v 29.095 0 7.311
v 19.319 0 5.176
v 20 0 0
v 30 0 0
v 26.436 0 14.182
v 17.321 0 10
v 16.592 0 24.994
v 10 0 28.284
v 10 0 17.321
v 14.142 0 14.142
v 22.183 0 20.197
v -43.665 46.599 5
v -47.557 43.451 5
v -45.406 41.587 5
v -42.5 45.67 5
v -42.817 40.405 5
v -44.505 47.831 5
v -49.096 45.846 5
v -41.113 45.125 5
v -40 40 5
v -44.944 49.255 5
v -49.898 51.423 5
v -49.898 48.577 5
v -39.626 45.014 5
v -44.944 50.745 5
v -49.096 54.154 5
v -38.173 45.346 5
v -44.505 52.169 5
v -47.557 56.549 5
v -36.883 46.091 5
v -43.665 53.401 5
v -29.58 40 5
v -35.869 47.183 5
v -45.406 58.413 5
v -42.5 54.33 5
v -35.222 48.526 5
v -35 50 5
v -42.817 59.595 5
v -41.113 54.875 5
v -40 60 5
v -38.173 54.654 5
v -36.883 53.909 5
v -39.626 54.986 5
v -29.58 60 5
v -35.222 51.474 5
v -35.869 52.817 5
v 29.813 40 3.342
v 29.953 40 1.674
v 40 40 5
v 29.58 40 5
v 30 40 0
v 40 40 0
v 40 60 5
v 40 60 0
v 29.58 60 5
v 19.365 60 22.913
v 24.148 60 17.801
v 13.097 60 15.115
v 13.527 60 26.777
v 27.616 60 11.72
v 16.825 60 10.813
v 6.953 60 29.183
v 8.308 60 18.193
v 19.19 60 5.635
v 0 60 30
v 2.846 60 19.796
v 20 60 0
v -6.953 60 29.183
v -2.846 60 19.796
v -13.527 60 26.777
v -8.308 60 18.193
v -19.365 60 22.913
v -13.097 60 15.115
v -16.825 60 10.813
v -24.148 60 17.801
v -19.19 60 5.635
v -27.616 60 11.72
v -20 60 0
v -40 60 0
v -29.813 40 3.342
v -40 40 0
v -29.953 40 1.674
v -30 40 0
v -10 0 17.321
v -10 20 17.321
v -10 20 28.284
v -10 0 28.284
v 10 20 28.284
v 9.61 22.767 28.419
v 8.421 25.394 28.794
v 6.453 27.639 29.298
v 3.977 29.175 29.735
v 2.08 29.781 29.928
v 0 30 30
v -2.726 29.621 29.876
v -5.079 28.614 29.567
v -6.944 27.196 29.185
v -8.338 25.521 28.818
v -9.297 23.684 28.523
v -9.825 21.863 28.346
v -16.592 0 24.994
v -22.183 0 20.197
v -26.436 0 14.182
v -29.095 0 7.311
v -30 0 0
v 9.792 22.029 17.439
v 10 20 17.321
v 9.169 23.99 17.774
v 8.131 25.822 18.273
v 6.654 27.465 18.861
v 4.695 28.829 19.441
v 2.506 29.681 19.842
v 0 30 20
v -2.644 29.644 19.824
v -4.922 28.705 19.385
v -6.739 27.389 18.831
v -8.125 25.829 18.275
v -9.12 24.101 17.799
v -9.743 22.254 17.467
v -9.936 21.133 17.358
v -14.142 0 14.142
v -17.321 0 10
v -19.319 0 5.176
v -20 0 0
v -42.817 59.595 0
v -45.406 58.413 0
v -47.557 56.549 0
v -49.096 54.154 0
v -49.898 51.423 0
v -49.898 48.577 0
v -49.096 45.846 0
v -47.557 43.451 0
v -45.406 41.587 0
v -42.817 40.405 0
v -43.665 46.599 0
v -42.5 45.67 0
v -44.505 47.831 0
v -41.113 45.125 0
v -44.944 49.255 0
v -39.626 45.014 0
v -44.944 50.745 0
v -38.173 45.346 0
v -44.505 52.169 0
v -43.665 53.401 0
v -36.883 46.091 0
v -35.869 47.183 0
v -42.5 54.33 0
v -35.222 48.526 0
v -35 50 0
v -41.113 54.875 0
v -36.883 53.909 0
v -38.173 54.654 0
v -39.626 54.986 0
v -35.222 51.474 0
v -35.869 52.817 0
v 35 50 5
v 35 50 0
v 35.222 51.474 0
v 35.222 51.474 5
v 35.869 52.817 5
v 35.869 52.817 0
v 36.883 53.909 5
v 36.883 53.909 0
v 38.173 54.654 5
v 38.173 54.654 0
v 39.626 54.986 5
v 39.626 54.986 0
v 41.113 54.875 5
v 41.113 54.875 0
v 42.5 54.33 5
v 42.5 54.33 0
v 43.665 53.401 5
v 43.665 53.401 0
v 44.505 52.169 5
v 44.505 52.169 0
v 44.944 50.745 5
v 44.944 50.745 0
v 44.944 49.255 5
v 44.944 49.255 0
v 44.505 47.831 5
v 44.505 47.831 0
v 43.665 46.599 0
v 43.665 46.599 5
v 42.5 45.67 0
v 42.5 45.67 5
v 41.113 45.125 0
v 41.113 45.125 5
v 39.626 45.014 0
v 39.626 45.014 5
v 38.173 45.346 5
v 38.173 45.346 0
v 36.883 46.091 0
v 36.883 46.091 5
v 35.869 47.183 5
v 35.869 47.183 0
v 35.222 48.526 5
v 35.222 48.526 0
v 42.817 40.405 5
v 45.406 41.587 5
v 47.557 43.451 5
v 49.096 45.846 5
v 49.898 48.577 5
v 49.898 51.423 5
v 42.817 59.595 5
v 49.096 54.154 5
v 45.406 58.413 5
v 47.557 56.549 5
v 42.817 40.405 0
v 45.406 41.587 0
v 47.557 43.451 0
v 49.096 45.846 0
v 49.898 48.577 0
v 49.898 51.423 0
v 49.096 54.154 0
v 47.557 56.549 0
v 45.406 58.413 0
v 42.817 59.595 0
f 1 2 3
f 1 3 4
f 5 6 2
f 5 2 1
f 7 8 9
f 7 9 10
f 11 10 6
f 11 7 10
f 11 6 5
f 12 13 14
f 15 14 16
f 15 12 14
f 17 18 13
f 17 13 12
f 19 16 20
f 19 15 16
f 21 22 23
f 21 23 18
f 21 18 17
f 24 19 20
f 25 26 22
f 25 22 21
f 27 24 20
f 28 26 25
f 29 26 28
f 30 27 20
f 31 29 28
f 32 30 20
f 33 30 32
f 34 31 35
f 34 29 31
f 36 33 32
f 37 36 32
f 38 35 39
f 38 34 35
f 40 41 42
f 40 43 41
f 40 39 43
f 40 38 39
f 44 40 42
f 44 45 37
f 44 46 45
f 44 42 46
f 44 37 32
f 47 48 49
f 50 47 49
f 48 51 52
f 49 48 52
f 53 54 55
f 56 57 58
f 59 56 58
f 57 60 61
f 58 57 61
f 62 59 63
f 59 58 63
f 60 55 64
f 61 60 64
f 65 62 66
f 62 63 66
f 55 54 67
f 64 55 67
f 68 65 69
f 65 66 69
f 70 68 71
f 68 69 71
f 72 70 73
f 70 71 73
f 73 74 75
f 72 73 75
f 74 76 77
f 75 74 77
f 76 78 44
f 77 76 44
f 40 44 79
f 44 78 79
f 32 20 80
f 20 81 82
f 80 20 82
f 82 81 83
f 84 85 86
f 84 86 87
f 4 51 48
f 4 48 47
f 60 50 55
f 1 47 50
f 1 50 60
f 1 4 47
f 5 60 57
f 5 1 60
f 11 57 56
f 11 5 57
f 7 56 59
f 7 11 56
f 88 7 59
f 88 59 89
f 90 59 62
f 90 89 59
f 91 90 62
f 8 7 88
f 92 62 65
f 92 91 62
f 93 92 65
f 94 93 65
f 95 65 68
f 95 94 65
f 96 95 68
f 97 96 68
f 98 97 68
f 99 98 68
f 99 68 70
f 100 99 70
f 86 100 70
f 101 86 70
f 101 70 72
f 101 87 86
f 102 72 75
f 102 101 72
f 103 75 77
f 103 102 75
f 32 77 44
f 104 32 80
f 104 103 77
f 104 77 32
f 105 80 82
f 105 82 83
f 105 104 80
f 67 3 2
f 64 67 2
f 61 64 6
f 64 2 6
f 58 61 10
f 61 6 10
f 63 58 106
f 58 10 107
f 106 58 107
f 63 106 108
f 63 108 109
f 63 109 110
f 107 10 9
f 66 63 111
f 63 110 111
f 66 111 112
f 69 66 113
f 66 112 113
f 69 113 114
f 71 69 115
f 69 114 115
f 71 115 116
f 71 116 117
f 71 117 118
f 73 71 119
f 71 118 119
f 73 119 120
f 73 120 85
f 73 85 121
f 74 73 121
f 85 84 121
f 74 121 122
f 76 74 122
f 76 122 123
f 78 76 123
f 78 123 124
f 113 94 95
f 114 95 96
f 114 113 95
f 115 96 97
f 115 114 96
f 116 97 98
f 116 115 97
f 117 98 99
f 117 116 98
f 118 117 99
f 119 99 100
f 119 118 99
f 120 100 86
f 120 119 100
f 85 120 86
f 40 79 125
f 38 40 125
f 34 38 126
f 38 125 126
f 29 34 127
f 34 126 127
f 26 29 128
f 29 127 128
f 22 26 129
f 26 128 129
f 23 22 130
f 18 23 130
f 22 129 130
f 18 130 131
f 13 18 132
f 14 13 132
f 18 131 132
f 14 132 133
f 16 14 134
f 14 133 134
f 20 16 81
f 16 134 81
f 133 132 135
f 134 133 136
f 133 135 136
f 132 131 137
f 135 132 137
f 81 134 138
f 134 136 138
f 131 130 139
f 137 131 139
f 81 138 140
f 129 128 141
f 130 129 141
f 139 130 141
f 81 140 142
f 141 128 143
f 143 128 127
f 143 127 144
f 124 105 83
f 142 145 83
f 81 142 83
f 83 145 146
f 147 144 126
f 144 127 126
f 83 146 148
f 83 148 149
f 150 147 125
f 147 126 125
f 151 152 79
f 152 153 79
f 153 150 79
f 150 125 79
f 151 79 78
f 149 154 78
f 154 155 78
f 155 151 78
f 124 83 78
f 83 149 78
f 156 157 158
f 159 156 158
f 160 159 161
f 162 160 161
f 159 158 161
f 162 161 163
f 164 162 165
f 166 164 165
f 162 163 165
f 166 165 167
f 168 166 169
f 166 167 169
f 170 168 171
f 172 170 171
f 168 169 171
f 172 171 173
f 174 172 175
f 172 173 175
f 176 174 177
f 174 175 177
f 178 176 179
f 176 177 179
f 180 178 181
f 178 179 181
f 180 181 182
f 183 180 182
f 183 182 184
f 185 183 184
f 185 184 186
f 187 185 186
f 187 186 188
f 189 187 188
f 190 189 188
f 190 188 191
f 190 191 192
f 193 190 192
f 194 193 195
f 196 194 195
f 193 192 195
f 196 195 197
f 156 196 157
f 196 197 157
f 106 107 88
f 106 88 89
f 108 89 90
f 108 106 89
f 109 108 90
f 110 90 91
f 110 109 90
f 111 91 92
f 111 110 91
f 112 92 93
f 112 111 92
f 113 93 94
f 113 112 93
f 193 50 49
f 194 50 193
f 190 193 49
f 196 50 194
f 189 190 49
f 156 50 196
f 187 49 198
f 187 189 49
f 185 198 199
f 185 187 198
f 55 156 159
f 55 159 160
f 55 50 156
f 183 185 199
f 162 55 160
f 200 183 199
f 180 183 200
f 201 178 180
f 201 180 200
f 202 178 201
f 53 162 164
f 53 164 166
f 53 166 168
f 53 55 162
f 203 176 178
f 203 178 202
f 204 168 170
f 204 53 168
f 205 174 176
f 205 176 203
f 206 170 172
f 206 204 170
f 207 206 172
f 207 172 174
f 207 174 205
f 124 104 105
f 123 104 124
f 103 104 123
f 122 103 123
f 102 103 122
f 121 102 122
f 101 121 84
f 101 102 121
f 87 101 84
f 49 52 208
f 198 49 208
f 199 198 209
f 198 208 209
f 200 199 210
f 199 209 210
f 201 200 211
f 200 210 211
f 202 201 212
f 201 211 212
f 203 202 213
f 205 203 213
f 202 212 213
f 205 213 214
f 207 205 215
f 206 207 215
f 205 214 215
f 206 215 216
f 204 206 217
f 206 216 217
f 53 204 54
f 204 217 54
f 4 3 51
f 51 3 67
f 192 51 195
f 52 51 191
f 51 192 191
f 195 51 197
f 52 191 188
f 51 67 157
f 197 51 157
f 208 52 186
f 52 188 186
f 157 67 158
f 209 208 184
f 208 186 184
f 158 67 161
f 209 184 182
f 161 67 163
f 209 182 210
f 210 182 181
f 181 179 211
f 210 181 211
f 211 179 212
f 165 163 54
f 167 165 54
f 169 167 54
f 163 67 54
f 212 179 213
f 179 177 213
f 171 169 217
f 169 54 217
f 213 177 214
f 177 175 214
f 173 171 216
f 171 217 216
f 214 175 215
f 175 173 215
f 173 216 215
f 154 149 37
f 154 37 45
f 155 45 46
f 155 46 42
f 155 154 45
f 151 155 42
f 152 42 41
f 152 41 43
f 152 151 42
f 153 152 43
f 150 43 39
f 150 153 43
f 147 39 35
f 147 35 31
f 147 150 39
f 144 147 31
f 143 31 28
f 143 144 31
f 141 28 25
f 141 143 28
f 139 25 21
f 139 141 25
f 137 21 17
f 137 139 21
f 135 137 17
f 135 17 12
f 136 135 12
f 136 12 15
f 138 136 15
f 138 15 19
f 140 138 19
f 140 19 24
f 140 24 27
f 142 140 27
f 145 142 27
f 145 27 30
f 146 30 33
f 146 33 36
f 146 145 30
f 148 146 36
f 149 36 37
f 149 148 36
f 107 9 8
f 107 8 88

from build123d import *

# Parameters (mm, degrees)
F2_DEPTH  = 60
F4_DEPTH  = 5
F5_R      = 5
F6_DEPTH  = 5
F8_DEPTH  = 30.0010001
F9_R      = 20
F10_DEPTH = 60.0010001


# Not quite as in the source:
# - a pattern or mirror of a feature is missing from the dataset's text; its kind, count and spacing are read off the source's solid


with BuildPart() as f2:
    # F1 (on Front) → F2 (new body)
    with BuildSketch(Plane.XZ):
        with BuildLine():
            Line((-30, 0), (30, 0))
            ThreePointArc((30, 0), (0, 30), (-30, 0))
        make_face()
    extrude(amount=-F2_DEPTH)

    # F3 (on Top) → F4 (join)
    with BuildSketch(Plane.XY):
        with BuildLine():
            ThreePointArc((-40, 60), (-50, 50), (-40, 40))
            Line((-40, 40), (40, 40))
            ThreePointArc((40, 40), (50, 50), (40, 60))
            Line((40, 60), (-40, 60))
        make_face()
    extrude(amount=F4_DEPTH)

    # F5 (on Top) → F6 (cut, through all)
    with BuildSketch(Plane.XY):
        with Locations((-40, 50)):
            Circle(F5_R)
    f6 = extrude(amount=F6_DEPTH, mode=Mode.SUBTRACT)

    # F6_copies: F6 across plane
    add(f6.mirror(Plane(origin=(0, 0, 0), x_dir=(0, 0, 1), z_dir=(1, 0, 0))), mode=Mode.SUBTRACT)

    # F7 (on Top) → F8 (cut, through all)
    with BuildSketch(Plane.XY):
        with BuildLine():
            Line((-10, 20), (-10, 0))
            Line((-10, 0), (0, 0))
            Line((0, 0), (0, 30))
            ThreePointArc((0, 30), (-7.0710678119, 27.0710678119), (-10, 20))
        make_face()
        with BuildLine():
            Line((0, 30), (0, 0))
            Line((0, 0), (10, 0))
            Line((10, 0), (10, 20))
            ThreePointArc((10, 20), (7.0710678119, 27.0710678119), (0, 30))
        make_face()
    extrude(amount=F8_DEPTH, mode=Mode.SUBTRACT)

    # F9 (on face) → F10 (cut, through all)
    with BuildSketch(Plane.XZ):
        Circle(F9_R)
    extrude(amount=-F10_DEPTH, mode=Mode.SUBTRACT)


solid = f2.part
